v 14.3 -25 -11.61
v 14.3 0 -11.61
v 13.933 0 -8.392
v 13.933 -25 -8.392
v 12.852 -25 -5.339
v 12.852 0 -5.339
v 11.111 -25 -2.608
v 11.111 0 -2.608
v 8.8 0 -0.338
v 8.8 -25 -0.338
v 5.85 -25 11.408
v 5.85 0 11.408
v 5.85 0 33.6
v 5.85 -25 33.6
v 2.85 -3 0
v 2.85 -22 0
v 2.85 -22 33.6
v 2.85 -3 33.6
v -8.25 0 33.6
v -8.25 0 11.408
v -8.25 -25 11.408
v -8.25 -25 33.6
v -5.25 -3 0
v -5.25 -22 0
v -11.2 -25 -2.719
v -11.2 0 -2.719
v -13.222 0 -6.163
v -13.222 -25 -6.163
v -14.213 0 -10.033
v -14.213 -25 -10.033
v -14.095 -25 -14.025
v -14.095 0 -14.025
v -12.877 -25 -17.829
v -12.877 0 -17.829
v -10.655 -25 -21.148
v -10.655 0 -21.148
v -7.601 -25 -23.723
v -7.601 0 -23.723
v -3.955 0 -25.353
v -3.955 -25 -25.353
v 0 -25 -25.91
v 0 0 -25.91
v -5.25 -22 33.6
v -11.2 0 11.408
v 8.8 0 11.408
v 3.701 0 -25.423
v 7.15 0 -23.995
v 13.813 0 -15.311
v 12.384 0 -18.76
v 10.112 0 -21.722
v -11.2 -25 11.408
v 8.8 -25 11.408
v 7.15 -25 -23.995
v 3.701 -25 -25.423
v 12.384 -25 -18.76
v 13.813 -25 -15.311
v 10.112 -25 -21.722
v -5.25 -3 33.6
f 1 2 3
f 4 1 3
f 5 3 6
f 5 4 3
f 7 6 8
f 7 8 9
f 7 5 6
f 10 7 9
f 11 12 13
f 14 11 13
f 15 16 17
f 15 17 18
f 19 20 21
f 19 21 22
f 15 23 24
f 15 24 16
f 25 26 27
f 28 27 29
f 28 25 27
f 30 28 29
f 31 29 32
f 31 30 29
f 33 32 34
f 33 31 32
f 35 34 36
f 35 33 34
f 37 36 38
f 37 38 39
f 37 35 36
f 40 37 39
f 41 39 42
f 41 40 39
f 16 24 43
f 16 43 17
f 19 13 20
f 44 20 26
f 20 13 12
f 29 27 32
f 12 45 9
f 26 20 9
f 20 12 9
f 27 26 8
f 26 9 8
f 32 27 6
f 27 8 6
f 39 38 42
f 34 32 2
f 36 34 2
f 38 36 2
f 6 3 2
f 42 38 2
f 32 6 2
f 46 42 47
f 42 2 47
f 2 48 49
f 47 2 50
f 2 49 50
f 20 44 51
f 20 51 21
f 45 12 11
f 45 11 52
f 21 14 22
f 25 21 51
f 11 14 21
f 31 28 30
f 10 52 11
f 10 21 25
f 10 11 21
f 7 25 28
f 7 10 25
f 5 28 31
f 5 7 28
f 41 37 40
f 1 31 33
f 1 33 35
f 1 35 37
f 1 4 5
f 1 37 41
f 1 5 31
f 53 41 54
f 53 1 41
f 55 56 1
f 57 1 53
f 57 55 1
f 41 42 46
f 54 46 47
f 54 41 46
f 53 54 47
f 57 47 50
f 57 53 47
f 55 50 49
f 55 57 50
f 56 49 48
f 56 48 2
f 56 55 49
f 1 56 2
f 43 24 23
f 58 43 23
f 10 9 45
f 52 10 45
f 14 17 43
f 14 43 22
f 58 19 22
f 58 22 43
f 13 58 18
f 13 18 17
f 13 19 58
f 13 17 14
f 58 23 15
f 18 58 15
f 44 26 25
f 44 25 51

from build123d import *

# Parameters (mm, degrees)
F0_W     = 20
F0_H     = 20
F2_DEPTH = 25
F1_W     = 14.1000001311
F1_H     = 39.2423100663
F3_DEPTH = 25
F6_W     = 8.1000001311
F6_H     = 19
F7_DEPTH = 33.6010025272


with BuildPart() as f2:
    # F0 (on Front) → F2 (new body)
    with BuildSketch(Plane.XZ):
        with Locations((-1.2000007555, 1.4076924609)):
            Rectangle(F0_W, F0_H)
    extrude(amount=F2_DEPTH)

    # F1 (on Front) → F3 (join)
    with BuildSketch(Plane.XZ):
        with Locations((-1.2000008211, 13.9788474941)):
            Rectangle(F1_W, F1_H)
    extrude(amount=F3_DEPTH)

    # F5: sweep along a path in F5_path
    with BuildLine(Plane(origin=(-11.2000007555, 0, 11.4076924609), x_dir=(0, 1, 0), z_dir=(0, 0, 1))) as f5_path:
        Line((0, 0), (-25, 0))
    # F4 (on Front) → F5 (sweep)
    with BuildSketch(Plane.XZ):
        with BuildLine():
            ThreePointArc((0, -25.9104435142), (10.111753936, -21.7220178946), (14.3001795556, -11.6102639586))
            ThreePointArc((14.3001795556, -11.6102639586), (-10.111753936, -1.4985100226), (0, -25.9104435142))
        make_face()
    sweep(path=f5_path.line)

    # F6 (on Top) → F7 (cut, through all)
    with BuildSketch(Plane.XY):
        with Locations((-1.2000008211, -12.5)):
            Rectangle(F6_W, F6_H)
    extrude(amount=F7_DEPTH, mode=Mode.SUBTRACT)


solid = f2.part
